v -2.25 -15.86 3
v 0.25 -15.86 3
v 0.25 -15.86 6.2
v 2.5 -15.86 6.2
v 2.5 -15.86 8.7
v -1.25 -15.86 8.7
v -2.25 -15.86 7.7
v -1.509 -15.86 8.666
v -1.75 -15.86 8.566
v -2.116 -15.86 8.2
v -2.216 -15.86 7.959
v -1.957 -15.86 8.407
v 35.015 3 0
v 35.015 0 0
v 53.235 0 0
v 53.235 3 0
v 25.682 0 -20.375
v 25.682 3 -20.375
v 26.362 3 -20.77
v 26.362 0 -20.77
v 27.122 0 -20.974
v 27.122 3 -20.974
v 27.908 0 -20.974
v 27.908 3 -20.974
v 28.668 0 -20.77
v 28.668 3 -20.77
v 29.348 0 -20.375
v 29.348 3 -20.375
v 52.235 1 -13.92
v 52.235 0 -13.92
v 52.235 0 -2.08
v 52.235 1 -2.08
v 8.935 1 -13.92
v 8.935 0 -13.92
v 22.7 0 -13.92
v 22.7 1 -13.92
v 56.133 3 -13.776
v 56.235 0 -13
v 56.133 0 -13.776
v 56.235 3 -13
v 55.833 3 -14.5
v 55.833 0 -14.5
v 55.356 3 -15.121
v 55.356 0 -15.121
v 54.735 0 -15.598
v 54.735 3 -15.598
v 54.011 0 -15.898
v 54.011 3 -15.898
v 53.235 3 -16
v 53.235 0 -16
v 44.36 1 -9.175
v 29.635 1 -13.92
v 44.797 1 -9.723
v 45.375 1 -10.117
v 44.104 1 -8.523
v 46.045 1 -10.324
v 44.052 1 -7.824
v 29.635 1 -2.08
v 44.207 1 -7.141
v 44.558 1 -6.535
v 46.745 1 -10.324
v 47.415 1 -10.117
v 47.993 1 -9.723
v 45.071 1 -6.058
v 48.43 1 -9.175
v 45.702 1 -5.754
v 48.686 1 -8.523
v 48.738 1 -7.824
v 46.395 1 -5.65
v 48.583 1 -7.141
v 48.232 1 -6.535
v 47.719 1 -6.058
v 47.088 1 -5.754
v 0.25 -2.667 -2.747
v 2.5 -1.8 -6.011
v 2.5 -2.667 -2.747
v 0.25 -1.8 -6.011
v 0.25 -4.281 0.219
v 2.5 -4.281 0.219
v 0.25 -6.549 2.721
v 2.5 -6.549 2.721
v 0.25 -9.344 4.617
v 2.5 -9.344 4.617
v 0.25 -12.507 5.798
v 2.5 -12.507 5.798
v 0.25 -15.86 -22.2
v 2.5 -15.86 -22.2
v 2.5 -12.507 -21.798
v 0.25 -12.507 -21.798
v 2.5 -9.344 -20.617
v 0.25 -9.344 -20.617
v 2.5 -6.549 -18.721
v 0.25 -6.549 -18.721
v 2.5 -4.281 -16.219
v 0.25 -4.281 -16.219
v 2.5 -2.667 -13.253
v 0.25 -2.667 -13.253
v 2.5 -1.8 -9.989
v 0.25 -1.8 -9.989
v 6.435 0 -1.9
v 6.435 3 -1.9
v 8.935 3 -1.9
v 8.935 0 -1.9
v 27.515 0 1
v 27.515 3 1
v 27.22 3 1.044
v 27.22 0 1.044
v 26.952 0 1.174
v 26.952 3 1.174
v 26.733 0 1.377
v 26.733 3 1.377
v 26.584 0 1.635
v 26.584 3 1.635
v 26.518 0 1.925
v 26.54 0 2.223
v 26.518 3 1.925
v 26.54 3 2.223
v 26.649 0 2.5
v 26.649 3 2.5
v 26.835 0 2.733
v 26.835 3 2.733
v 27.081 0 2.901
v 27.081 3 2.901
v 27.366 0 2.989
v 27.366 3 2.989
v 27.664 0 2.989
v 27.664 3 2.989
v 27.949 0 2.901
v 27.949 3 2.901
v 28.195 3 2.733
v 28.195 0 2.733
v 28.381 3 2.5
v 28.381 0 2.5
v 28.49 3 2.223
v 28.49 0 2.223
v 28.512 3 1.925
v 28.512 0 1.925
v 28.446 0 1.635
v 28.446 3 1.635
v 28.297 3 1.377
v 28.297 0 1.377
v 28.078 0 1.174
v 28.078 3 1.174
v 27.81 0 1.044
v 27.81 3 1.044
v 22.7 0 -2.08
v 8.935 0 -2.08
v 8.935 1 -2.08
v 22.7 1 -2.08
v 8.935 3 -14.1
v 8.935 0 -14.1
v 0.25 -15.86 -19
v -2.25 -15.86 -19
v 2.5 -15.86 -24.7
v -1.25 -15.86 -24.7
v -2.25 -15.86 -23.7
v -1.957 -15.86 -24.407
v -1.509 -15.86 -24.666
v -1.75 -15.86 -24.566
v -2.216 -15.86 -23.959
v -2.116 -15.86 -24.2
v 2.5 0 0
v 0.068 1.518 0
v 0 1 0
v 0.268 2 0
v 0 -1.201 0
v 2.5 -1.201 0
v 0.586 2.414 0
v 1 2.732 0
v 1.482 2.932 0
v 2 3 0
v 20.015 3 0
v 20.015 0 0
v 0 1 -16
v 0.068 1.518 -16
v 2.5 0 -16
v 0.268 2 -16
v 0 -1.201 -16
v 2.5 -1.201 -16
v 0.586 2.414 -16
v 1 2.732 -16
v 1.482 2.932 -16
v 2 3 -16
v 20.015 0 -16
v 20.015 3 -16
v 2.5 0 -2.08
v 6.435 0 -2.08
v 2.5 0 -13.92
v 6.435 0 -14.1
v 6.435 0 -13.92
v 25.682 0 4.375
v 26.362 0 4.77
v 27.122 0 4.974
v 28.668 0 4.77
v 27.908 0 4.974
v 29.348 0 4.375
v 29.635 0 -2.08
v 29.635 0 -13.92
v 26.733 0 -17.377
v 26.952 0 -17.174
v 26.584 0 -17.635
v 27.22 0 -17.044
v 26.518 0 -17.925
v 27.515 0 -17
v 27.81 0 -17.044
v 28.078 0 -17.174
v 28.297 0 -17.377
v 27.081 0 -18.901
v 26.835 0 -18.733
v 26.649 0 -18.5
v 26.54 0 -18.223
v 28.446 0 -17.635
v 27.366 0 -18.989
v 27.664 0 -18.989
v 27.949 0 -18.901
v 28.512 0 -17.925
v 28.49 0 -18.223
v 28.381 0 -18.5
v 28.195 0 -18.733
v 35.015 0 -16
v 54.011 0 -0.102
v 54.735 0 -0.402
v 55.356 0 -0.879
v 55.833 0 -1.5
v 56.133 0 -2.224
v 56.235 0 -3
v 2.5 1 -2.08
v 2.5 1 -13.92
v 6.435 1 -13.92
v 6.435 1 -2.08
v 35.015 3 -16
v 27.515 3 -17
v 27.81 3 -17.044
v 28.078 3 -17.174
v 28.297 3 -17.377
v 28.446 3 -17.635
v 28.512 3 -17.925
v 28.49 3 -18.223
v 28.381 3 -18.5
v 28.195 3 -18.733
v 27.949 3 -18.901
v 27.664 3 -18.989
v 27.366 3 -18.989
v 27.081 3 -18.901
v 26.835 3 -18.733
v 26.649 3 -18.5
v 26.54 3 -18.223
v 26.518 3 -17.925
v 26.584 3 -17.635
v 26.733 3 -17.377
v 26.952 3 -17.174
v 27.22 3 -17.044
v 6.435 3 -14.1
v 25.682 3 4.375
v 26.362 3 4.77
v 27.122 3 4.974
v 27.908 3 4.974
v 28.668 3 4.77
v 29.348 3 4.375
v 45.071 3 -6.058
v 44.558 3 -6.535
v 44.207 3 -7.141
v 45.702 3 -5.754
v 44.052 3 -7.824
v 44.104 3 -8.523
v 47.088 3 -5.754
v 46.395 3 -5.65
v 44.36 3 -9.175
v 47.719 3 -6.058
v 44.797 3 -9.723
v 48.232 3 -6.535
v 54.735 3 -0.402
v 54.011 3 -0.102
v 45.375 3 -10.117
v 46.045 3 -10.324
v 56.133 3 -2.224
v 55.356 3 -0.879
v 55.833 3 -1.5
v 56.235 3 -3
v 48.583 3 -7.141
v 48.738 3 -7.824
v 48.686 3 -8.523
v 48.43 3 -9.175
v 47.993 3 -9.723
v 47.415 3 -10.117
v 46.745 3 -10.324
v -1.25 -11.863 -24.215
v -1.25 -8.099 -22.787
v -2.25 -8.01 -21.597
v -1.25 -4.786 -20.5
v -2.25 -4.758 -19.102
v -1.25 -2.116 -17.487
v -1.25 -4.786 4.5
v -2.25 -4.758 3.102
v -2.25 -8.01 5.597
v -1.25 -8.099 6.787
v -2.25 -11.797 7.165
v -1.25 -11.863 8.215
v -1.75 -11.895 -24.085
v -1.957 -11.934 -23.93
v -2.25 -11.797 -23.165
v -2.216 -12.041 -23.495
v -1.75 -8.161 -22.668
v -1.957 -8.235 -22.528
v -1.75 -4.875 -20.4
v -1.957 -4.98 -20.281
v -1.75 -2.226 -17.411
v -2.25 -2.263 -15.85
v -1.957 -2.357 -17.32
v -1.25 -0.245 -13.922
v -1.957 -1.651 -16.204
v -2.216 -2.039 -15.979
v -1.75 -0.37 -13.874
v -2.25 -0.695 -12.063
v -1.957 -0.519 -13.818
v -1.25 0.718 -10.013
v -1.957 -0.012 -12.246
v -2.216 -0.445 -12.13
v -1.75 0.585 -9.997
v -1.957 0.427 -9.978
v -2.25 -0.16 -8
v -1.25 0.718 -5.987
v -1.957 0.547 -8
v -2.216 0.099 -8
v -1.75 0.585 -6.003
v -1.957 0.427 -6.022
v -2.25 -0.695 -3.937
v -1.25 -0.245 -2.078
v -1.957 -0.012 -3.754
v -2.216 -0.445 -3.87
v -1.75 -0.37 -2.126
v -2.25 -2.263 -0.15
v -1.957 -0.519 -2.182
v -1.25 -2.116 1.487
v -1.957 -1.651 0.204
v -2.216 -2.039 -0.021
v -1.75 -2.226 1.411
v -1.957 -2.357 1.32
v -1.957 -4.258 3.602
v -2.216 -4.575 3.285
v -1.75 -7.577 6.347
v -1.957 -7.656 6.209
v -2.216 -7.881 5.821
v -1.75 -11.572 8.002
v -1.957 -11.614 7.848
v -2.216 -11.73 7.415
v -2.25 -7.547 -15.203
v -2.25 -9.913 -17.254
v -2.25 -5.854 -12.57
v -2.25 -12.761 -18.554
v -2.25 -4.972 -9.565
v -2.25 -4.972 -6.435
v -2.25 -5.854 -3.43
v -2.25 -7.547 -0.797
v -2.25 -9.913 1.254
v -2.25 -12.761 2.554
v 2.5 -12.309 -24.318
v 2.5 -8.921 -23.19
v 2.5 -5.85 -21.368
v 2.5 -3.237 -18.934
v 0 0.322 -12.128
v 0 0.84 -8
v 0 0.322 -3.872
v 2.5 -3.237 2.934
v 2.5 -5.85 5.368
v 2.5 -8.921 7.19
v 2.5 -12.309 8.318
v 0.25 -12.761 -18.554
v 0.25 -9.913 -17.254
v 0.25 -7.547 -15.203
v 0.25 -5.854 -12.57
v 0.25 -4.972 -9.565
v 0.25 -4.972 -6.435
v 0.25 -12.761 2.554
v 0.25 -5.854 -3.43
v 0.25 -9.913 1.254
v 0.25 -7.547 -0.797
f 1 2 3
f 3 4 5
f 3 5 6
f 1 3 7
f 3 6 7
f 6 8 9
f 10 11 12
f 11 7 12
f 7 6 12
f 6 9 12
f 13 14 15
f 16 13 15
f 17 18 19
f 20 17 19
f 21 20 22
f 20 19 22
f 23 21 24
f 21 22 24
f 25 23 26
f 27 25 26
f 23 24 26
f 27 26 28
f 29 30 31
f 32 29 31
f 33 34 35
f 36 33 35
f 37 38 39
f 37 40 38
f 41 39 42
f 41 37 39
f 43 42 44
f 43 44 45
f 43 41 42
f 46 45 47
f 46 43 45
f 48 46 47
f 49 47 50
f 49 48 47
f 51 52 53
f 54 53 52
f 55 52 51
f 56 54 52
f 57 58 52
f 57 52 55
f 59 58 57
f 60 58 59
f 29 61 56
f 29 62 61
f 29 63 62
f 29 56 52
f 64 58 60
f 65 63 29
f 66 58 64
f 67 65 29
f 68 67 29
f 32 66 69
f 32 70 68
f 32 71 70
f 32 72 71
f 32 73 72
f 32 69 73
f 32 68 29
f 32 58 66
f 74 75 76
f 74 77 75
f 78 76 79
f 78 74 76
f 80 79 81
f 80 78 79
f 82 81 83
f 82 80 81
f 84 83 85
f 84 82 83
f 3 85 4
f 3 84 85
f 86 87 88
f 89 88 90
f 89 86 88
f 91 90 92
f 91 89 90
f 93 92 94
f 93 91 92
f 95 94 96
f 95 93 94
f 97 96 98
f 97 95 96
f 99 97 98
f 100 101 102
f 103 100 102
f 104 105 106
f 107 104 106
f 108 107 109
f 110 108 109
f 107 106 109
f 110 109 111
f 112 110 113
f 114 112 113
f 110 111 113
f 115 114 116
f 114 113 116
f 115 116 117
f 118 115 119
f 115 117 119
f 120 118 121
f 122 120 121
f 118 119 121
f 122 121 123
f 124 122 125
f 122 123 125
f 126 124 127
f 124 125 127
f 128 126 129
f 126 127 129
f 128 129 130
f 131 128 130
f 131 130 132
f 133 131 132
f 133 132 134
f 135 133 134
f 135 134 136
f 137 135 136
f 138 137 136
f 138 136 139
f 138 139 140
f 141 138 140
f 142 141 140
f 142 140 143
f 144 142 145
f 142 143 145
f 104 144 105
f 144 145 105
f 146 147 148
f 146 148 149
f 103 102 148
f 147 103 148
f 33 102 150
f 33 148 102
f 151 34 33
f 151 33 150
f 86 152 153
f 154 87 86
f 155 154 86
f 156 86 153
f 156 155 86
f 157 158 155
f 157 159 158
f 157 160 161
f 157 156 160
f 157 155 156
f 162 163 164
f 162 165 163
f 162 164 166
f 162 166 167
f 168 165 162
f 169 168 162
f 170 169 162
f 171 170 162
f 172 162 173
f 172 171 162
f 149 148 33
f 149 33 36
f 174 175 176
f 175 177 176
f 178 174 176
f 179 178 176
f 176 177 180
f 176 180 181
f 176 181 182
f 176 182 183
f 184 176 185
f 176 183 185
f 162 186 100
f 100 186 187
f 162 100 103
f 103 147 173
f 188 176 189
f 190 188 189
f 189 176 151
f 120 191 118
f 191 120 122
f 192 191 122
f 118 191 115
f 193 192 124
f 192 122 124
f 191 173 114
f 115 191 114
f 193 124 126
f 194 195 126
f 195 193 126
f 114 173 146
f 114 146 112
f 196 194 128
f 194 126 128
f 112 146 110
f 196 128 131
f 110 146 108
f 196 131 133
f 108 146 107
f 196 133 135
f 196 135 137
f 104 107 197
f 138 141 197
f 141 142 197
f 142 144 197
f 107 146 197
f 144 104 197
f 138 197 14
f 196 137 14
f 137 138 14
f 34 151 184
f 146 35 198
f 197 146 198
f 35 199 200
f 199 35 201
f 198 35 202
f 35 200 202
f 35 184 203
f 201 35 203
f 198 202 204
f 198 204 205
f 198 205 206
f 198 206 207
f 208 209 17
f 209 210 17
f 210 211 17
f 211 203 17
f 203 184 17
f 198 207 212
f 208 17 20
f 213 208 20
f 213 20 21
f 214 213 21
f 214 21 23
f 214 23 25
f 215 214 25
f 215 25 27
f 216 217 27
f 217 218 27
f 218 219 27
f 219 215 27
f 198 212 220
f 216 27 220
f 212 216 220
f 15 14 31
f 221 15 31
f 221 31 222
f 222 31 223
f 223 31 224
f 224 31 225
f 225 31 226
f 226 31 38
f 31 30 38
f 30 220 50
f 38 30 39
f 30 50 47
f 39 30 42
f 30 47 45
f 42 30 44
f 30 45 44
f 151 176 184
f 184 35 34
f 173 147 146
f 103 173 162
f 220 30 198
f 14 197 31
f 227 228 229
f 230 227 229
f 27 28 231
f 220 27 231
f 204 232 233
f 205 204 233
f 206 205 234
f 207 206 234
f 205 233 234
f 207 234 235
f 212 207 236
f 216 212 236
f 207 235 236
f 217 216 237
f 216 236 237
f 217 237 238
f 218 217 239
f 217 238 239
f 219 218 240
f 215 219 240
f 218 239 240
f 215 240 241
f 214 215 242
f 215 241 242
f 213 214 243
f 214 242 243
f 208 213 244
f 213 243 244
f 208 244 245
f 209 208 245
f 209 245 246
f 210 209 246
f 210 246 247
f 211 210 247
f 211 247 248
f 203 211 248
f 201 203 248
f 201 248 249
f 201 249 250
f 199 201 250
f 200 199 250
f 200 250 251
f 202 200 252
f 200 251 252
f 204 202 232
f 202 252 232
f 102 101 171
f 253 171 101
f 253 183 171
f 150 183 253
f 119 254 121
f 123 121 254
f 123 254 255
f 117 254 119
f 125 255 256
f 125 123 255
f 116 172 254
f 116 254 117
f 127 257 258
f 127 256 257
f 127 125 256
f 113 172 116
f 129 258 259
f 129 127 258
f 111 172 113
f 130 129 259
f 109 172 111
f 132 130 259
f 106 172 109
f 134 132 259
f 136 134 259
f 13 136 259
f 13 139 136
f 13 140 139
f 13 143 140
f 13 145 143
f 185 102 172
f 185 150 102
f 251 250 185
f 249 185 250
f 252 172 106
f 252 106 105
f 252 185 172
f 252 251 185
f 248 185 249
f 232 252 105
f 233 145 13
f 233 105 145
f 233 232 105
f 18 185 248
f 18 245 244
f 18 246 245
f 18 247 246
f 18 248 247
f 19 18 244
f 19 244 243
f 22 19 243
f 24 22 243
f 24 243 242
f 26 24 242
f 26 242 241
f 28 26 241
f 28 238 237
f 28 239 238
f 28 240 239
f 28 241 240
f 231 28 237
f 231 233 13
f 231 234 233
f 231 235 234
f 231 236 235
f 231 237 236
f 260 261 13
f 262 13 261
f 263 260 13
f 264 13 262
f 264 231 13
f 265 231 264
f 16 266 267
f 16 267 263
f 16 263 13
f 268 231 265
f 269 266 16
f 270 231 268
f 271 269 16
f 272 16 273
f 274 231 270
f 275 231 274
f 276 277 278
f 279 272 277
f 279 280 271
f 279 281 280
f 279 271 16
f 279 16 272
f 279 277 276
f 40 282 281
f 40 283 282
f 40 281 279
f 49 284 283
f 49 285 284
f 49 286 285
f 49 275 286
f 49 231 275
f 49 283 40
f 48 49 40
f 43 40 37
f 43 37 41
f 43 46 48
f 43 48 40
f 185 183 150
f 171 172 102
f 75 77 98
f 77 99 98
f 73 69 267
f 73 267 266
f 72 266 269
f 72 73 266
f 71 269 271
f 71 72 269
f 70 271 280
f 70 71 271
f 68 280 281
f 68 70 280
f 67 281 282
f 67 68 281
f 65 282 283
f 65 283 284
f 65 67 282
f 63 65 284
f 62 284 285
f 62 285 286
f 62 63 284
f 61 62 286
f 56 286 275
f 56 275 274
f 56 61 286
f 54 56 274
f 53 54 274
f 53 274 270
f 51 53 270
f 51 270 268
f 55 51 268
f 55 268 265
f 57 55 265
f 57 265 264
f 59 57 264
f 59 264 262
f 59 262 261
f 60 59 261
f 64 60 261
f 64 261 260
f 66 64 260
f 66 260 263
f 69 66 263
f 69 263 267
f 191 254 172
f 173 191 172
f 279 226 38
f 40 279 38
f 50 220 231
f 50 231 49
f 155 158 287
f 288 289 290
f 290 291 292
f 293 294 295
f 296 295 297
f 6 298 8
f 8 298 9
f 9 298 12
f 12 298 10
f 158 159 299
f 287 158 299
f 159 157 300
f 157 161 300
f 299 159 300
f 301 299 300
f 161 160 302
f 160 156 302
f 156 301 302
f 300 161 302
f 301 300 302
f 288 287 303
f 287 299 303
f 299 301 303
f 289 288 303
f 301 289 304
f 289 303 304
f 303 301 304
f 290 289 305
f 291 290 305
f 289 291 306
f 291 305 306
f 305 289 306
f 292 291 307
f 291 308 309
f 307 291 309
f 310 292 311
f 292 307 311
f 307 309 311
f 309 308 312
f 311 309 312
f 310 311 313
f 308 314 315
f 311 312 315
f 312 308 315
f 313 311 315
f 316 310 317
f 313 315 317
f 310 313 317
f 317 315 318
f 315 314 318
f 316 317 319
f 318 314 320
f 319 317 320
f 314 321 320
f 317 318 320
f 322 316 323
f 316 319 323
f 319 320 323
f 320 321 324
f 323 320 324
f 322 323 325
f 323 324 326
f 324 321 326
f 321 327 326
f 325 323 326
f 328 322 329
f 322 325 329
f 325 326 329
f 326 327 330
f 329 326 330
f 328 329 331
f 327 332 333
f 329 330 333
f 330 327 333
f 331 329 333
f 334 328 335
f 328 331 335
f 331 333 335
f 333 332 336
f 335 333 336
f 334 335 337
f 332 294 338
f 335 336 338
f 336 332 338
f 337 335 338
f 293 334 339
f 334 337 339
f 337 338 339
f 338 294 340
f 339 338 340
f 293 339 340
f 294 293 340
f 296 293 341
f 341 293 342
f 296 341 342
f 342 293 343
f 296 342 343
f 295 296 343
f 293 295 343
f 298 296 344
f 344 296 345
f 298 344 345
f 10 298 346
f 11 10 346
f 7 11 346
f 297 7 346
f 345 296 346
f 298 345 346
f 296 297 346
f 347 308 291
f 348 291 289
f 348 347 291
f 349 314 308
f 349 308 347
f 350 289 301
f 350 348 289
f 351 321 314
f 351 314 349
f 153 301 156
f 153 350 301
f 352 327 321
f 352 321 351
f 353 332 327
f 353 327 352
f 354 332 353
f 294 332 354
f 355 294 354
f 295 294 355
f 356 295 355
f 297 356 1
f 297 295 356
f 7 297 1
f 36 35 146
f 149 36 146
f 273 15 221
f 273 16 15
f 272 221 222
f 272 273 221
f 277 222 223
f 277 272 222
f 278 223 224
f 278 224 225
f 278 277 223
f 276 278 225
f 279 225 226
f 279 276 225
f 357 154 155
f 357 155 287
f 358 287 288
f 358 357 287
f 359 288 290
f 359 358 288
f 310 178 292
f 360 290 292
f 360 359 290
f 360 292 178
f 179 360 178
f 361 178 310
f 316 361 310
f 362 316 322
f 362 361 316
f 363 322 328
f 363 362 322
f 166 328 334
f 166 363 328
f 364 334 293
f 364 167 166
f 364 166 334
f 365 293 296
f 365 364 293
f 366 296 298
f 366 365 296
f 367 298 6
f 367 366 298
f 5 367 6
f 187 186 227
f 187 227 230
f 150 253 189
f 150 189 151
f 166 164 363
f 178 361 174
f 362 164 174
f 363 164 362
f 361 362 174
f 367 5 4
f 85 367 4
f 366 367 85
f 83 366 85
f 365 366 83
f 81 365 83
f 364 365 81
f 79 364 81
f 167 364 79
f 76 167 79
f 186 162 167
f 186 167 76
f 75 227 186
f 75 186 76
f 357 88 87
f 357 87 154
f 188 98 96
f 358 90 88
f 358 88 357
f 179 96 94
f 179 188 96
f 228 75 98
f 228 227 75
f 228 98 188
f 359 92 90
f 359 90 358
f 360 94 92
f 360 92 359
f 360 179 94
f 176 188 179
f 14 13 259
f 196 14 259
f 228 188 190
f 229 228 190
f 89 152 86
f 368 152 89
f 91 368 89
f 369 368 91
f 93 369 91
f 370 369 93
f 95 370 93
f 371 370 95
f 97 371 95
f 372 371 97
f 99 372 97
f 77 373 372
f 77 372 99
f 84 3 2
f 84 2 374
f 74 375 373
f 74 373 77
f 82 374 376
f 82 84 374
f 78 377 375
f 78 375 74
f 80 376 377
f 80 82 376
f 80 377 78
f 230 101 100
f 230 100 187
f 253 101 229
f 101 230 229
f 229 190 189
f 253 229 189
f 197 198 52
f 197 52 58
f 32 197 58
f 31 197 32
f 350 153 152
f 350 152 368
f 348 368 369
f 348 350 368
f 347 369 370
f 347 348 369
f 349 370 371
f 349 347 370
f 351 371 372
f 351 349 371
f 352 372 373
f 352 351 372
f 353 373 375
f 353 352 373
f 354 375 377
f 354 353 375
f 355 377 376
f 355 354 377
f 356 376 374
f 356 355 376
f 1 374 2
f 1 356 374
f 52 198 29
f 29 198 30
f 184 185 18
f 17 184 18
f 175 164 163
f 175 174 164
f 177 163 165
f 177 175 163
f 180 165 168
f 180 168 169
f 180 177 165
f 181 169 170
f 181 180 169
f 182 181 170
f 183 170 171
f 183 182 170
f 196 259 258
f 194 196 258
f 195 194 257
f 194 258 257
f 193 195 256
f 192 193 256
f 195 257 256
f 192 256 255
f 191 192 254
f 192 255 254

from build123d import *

# Parameters (mm, degrees)
SKETCH1_W                   = 56.235
SKETCH1_H                   = 16
SKETCH1_R                   = 2.35
SKETCH1_W_2                 = 2.5
SKETCH1_H_2                 = 12.2
BOSS_EXTRUDE1_DEPTH         = 3
ESQUISSE3_W                 = 22.7
ESQUISSE3_H                 = 11.84
ESQUISSE3_W_2               = 22.6
ENL_V_MAT_EXTRU_1_DEPTH     = 1
ESQUISSE4_R                 = 1
BOSS_EXTRU_2_DEPTH          = 3
R_VOLUTION1_ANGLE           = 90
R_VOLUTION1_OTHER_WAY_ANGLE = 90
ESQUISSE6_W                 = 2.5
ESQUISSE6_H                 = 16
BOSS_EXTRU_3_DEPTH          = 4.8
CONG_1_R                    = 2
CONG_2_R                    = 3
CONG_3_R                    = 1


with BuildPart() as part:
    # Sketch1 → Boss-Extrude1 (new body)
    with BuildSketch(Plane(origin=(0, 0, 0), x_dir=(1, 0, 0), z_dir=(0, 1, 0))):
        with Locations((28.1175, 8)):
            Rectangle(SKETCH1_W, SKETCH1_H)
        with Locations(Location((46.395, 8, 0), (0, 0, 270))):
            Circle(SKETCH1_R, mode=Mode.SUBTRACT)
        with Locations((7.685, 8)):
            Rectangle(SKETCH1_W_2, SKETCH1_H_2, mode=Mode.SUBTRACT)
    extrude(amount=BOSS_EXTRUDE1_DEPTH)

    # Esquisse3 → Enlèv. mat.-Extru.1 (cut)
    with BuildSketch(Plane.XZ):
        with Locations((11.35, -8)):
            Rectangle(ESQUISSE3_W, ESQUISSE3_H)
        with Locations((40.935, -8)):
            Rectangle(ESQUISSE3_W_2, ESQUISSE3_H)
    extrude(amount=-ENL_V_MAT_EXTRU_1_DEPTH, mode=Mode.SUBTRACT)

    # Esquisse4 → Boss.-Extru.2 (add)
    # profile 1 of 2: a face of its own
    with BuildSketch(Plane(origin=(0, 3, 0), x_dir=(1, 0, 0), z_dir=(0, 1, 0))):
        with BuildLine():
            Line((20.015, 16), (25.681747499, 20.374696879))
            ThreePointArc((25.681747499, 20.374696879), (27.515, 21), (29.348252501, 20.374696879))
            Line((29.348252501, 20.374696879), (35.015, 16))
            Line((35.015, 16), (27.515, 16))
            Line((27.515, 16), (20.015, 16))
        make_face()
        with Locations(Location((27.515, 18, 0), (0, 0, 270))):
            Circle(ESQUISSE4_R, mode=Mode.SUBTRACT)
    # profile 2 of 2: a face of its own
    with BuildSketch(Plane(origin=(0, 3, 0), x_dir=(1, 0, 0), z_dir=(0, 1, 0))):
        with BuildLine():
            Line((27.515, 0), (35.015, 0))
            Line((35.015, 0), (29.348252501, -4.374696879))
            ThreePointArc((29.348252501, -4.374696879), (27.515, -5), (25.681747499, -4.374696879))
            Line((25.681747499, -4.374696879), (20.015, 0))
            Line((20.015, 0), (27.515, 0))
        make_face()
        with Locations(Location((27.515, -2, 0), (0, 0, 90))):
            Circle(ESQUISSE4_R, mode=Mode.SUBTRACT)
    extrude(amount=-BOSS_EXTRU_2_DEPTH)



with BuildPart() as body_2:
    # Esquisse5 → Révolution1 (revolve)
    with BuildSketch(Plane.XY.offset(-8)):
        Polygon((-2.25, 0.84), (2.5, 0.84), (2.5, -1.66), (0.25, -1.66), (0.25, -4.86), (-2.25, -4.86), align=None)
    revolve(axis=Axis((-14.237579535, -15.86, -8), (-1, 0, 0)), revolution_arc=R_VOLUTION1_ANGLE)

    # Esquisse5 → Révolution1 other way (revolve)
    with BuildSketch(Plane.XY.offset(-8)):
        Polygon((-2.25, 0.84), (2.5, 0.84), (2.5, -1.66), (0.25, -1.66), (0.25, -4.86), (-2.25, -4.86), align=None)
    revolve(axis=Axis((-14.237579535, -15.86, -8), (1, 0, 0)), revolution_arc=R_VOLUTION1_OTHER_WAY_ANGLE)


with BuildPart() as part_1:
    add(part.part)

    add(body_2.part)  # Boss.-Extru.3 merges body 2
    # Esquisse6 → Boss.-Extru.3 (add)
    with BuildSketch(Plane(origin=(0, 3, 0), x_dir=(1, 0, 0), z_dir=(0, 1, 0))):
        with Locations((1.25, 8)):
            Rectangle(ESQUISSE6_W, ESQUISSE6_H)
    extrude(amount=-BOSS_EXTRU_3_DEPTH)

    # Congé1
    cong_1_edges = [part_1.edges().sort_by_distance(p)[0] for p in [
        (0, 3, -8),
    ]]
    fillet(cong_1_edges, radius=CONG_1_R)

    # Congé2
    cong_2_edges = [part_1.edges().sort_by_distance(p)[0] for p in [
        (56.235, 1.5, -16),
        (56.235, 1.5, 0),
    ]]
    fillet(cong_2_edges, radius=CONG_2_R)

    # Congé3
    cong_3_edges = [part_1.edges().sort_by_distance(p)[0] for p in [
        (-2.25, 0.84, -8),
    ]]
    fillet(cong_3_edges, radius=CONG_3_R)


solid = part_1.part
